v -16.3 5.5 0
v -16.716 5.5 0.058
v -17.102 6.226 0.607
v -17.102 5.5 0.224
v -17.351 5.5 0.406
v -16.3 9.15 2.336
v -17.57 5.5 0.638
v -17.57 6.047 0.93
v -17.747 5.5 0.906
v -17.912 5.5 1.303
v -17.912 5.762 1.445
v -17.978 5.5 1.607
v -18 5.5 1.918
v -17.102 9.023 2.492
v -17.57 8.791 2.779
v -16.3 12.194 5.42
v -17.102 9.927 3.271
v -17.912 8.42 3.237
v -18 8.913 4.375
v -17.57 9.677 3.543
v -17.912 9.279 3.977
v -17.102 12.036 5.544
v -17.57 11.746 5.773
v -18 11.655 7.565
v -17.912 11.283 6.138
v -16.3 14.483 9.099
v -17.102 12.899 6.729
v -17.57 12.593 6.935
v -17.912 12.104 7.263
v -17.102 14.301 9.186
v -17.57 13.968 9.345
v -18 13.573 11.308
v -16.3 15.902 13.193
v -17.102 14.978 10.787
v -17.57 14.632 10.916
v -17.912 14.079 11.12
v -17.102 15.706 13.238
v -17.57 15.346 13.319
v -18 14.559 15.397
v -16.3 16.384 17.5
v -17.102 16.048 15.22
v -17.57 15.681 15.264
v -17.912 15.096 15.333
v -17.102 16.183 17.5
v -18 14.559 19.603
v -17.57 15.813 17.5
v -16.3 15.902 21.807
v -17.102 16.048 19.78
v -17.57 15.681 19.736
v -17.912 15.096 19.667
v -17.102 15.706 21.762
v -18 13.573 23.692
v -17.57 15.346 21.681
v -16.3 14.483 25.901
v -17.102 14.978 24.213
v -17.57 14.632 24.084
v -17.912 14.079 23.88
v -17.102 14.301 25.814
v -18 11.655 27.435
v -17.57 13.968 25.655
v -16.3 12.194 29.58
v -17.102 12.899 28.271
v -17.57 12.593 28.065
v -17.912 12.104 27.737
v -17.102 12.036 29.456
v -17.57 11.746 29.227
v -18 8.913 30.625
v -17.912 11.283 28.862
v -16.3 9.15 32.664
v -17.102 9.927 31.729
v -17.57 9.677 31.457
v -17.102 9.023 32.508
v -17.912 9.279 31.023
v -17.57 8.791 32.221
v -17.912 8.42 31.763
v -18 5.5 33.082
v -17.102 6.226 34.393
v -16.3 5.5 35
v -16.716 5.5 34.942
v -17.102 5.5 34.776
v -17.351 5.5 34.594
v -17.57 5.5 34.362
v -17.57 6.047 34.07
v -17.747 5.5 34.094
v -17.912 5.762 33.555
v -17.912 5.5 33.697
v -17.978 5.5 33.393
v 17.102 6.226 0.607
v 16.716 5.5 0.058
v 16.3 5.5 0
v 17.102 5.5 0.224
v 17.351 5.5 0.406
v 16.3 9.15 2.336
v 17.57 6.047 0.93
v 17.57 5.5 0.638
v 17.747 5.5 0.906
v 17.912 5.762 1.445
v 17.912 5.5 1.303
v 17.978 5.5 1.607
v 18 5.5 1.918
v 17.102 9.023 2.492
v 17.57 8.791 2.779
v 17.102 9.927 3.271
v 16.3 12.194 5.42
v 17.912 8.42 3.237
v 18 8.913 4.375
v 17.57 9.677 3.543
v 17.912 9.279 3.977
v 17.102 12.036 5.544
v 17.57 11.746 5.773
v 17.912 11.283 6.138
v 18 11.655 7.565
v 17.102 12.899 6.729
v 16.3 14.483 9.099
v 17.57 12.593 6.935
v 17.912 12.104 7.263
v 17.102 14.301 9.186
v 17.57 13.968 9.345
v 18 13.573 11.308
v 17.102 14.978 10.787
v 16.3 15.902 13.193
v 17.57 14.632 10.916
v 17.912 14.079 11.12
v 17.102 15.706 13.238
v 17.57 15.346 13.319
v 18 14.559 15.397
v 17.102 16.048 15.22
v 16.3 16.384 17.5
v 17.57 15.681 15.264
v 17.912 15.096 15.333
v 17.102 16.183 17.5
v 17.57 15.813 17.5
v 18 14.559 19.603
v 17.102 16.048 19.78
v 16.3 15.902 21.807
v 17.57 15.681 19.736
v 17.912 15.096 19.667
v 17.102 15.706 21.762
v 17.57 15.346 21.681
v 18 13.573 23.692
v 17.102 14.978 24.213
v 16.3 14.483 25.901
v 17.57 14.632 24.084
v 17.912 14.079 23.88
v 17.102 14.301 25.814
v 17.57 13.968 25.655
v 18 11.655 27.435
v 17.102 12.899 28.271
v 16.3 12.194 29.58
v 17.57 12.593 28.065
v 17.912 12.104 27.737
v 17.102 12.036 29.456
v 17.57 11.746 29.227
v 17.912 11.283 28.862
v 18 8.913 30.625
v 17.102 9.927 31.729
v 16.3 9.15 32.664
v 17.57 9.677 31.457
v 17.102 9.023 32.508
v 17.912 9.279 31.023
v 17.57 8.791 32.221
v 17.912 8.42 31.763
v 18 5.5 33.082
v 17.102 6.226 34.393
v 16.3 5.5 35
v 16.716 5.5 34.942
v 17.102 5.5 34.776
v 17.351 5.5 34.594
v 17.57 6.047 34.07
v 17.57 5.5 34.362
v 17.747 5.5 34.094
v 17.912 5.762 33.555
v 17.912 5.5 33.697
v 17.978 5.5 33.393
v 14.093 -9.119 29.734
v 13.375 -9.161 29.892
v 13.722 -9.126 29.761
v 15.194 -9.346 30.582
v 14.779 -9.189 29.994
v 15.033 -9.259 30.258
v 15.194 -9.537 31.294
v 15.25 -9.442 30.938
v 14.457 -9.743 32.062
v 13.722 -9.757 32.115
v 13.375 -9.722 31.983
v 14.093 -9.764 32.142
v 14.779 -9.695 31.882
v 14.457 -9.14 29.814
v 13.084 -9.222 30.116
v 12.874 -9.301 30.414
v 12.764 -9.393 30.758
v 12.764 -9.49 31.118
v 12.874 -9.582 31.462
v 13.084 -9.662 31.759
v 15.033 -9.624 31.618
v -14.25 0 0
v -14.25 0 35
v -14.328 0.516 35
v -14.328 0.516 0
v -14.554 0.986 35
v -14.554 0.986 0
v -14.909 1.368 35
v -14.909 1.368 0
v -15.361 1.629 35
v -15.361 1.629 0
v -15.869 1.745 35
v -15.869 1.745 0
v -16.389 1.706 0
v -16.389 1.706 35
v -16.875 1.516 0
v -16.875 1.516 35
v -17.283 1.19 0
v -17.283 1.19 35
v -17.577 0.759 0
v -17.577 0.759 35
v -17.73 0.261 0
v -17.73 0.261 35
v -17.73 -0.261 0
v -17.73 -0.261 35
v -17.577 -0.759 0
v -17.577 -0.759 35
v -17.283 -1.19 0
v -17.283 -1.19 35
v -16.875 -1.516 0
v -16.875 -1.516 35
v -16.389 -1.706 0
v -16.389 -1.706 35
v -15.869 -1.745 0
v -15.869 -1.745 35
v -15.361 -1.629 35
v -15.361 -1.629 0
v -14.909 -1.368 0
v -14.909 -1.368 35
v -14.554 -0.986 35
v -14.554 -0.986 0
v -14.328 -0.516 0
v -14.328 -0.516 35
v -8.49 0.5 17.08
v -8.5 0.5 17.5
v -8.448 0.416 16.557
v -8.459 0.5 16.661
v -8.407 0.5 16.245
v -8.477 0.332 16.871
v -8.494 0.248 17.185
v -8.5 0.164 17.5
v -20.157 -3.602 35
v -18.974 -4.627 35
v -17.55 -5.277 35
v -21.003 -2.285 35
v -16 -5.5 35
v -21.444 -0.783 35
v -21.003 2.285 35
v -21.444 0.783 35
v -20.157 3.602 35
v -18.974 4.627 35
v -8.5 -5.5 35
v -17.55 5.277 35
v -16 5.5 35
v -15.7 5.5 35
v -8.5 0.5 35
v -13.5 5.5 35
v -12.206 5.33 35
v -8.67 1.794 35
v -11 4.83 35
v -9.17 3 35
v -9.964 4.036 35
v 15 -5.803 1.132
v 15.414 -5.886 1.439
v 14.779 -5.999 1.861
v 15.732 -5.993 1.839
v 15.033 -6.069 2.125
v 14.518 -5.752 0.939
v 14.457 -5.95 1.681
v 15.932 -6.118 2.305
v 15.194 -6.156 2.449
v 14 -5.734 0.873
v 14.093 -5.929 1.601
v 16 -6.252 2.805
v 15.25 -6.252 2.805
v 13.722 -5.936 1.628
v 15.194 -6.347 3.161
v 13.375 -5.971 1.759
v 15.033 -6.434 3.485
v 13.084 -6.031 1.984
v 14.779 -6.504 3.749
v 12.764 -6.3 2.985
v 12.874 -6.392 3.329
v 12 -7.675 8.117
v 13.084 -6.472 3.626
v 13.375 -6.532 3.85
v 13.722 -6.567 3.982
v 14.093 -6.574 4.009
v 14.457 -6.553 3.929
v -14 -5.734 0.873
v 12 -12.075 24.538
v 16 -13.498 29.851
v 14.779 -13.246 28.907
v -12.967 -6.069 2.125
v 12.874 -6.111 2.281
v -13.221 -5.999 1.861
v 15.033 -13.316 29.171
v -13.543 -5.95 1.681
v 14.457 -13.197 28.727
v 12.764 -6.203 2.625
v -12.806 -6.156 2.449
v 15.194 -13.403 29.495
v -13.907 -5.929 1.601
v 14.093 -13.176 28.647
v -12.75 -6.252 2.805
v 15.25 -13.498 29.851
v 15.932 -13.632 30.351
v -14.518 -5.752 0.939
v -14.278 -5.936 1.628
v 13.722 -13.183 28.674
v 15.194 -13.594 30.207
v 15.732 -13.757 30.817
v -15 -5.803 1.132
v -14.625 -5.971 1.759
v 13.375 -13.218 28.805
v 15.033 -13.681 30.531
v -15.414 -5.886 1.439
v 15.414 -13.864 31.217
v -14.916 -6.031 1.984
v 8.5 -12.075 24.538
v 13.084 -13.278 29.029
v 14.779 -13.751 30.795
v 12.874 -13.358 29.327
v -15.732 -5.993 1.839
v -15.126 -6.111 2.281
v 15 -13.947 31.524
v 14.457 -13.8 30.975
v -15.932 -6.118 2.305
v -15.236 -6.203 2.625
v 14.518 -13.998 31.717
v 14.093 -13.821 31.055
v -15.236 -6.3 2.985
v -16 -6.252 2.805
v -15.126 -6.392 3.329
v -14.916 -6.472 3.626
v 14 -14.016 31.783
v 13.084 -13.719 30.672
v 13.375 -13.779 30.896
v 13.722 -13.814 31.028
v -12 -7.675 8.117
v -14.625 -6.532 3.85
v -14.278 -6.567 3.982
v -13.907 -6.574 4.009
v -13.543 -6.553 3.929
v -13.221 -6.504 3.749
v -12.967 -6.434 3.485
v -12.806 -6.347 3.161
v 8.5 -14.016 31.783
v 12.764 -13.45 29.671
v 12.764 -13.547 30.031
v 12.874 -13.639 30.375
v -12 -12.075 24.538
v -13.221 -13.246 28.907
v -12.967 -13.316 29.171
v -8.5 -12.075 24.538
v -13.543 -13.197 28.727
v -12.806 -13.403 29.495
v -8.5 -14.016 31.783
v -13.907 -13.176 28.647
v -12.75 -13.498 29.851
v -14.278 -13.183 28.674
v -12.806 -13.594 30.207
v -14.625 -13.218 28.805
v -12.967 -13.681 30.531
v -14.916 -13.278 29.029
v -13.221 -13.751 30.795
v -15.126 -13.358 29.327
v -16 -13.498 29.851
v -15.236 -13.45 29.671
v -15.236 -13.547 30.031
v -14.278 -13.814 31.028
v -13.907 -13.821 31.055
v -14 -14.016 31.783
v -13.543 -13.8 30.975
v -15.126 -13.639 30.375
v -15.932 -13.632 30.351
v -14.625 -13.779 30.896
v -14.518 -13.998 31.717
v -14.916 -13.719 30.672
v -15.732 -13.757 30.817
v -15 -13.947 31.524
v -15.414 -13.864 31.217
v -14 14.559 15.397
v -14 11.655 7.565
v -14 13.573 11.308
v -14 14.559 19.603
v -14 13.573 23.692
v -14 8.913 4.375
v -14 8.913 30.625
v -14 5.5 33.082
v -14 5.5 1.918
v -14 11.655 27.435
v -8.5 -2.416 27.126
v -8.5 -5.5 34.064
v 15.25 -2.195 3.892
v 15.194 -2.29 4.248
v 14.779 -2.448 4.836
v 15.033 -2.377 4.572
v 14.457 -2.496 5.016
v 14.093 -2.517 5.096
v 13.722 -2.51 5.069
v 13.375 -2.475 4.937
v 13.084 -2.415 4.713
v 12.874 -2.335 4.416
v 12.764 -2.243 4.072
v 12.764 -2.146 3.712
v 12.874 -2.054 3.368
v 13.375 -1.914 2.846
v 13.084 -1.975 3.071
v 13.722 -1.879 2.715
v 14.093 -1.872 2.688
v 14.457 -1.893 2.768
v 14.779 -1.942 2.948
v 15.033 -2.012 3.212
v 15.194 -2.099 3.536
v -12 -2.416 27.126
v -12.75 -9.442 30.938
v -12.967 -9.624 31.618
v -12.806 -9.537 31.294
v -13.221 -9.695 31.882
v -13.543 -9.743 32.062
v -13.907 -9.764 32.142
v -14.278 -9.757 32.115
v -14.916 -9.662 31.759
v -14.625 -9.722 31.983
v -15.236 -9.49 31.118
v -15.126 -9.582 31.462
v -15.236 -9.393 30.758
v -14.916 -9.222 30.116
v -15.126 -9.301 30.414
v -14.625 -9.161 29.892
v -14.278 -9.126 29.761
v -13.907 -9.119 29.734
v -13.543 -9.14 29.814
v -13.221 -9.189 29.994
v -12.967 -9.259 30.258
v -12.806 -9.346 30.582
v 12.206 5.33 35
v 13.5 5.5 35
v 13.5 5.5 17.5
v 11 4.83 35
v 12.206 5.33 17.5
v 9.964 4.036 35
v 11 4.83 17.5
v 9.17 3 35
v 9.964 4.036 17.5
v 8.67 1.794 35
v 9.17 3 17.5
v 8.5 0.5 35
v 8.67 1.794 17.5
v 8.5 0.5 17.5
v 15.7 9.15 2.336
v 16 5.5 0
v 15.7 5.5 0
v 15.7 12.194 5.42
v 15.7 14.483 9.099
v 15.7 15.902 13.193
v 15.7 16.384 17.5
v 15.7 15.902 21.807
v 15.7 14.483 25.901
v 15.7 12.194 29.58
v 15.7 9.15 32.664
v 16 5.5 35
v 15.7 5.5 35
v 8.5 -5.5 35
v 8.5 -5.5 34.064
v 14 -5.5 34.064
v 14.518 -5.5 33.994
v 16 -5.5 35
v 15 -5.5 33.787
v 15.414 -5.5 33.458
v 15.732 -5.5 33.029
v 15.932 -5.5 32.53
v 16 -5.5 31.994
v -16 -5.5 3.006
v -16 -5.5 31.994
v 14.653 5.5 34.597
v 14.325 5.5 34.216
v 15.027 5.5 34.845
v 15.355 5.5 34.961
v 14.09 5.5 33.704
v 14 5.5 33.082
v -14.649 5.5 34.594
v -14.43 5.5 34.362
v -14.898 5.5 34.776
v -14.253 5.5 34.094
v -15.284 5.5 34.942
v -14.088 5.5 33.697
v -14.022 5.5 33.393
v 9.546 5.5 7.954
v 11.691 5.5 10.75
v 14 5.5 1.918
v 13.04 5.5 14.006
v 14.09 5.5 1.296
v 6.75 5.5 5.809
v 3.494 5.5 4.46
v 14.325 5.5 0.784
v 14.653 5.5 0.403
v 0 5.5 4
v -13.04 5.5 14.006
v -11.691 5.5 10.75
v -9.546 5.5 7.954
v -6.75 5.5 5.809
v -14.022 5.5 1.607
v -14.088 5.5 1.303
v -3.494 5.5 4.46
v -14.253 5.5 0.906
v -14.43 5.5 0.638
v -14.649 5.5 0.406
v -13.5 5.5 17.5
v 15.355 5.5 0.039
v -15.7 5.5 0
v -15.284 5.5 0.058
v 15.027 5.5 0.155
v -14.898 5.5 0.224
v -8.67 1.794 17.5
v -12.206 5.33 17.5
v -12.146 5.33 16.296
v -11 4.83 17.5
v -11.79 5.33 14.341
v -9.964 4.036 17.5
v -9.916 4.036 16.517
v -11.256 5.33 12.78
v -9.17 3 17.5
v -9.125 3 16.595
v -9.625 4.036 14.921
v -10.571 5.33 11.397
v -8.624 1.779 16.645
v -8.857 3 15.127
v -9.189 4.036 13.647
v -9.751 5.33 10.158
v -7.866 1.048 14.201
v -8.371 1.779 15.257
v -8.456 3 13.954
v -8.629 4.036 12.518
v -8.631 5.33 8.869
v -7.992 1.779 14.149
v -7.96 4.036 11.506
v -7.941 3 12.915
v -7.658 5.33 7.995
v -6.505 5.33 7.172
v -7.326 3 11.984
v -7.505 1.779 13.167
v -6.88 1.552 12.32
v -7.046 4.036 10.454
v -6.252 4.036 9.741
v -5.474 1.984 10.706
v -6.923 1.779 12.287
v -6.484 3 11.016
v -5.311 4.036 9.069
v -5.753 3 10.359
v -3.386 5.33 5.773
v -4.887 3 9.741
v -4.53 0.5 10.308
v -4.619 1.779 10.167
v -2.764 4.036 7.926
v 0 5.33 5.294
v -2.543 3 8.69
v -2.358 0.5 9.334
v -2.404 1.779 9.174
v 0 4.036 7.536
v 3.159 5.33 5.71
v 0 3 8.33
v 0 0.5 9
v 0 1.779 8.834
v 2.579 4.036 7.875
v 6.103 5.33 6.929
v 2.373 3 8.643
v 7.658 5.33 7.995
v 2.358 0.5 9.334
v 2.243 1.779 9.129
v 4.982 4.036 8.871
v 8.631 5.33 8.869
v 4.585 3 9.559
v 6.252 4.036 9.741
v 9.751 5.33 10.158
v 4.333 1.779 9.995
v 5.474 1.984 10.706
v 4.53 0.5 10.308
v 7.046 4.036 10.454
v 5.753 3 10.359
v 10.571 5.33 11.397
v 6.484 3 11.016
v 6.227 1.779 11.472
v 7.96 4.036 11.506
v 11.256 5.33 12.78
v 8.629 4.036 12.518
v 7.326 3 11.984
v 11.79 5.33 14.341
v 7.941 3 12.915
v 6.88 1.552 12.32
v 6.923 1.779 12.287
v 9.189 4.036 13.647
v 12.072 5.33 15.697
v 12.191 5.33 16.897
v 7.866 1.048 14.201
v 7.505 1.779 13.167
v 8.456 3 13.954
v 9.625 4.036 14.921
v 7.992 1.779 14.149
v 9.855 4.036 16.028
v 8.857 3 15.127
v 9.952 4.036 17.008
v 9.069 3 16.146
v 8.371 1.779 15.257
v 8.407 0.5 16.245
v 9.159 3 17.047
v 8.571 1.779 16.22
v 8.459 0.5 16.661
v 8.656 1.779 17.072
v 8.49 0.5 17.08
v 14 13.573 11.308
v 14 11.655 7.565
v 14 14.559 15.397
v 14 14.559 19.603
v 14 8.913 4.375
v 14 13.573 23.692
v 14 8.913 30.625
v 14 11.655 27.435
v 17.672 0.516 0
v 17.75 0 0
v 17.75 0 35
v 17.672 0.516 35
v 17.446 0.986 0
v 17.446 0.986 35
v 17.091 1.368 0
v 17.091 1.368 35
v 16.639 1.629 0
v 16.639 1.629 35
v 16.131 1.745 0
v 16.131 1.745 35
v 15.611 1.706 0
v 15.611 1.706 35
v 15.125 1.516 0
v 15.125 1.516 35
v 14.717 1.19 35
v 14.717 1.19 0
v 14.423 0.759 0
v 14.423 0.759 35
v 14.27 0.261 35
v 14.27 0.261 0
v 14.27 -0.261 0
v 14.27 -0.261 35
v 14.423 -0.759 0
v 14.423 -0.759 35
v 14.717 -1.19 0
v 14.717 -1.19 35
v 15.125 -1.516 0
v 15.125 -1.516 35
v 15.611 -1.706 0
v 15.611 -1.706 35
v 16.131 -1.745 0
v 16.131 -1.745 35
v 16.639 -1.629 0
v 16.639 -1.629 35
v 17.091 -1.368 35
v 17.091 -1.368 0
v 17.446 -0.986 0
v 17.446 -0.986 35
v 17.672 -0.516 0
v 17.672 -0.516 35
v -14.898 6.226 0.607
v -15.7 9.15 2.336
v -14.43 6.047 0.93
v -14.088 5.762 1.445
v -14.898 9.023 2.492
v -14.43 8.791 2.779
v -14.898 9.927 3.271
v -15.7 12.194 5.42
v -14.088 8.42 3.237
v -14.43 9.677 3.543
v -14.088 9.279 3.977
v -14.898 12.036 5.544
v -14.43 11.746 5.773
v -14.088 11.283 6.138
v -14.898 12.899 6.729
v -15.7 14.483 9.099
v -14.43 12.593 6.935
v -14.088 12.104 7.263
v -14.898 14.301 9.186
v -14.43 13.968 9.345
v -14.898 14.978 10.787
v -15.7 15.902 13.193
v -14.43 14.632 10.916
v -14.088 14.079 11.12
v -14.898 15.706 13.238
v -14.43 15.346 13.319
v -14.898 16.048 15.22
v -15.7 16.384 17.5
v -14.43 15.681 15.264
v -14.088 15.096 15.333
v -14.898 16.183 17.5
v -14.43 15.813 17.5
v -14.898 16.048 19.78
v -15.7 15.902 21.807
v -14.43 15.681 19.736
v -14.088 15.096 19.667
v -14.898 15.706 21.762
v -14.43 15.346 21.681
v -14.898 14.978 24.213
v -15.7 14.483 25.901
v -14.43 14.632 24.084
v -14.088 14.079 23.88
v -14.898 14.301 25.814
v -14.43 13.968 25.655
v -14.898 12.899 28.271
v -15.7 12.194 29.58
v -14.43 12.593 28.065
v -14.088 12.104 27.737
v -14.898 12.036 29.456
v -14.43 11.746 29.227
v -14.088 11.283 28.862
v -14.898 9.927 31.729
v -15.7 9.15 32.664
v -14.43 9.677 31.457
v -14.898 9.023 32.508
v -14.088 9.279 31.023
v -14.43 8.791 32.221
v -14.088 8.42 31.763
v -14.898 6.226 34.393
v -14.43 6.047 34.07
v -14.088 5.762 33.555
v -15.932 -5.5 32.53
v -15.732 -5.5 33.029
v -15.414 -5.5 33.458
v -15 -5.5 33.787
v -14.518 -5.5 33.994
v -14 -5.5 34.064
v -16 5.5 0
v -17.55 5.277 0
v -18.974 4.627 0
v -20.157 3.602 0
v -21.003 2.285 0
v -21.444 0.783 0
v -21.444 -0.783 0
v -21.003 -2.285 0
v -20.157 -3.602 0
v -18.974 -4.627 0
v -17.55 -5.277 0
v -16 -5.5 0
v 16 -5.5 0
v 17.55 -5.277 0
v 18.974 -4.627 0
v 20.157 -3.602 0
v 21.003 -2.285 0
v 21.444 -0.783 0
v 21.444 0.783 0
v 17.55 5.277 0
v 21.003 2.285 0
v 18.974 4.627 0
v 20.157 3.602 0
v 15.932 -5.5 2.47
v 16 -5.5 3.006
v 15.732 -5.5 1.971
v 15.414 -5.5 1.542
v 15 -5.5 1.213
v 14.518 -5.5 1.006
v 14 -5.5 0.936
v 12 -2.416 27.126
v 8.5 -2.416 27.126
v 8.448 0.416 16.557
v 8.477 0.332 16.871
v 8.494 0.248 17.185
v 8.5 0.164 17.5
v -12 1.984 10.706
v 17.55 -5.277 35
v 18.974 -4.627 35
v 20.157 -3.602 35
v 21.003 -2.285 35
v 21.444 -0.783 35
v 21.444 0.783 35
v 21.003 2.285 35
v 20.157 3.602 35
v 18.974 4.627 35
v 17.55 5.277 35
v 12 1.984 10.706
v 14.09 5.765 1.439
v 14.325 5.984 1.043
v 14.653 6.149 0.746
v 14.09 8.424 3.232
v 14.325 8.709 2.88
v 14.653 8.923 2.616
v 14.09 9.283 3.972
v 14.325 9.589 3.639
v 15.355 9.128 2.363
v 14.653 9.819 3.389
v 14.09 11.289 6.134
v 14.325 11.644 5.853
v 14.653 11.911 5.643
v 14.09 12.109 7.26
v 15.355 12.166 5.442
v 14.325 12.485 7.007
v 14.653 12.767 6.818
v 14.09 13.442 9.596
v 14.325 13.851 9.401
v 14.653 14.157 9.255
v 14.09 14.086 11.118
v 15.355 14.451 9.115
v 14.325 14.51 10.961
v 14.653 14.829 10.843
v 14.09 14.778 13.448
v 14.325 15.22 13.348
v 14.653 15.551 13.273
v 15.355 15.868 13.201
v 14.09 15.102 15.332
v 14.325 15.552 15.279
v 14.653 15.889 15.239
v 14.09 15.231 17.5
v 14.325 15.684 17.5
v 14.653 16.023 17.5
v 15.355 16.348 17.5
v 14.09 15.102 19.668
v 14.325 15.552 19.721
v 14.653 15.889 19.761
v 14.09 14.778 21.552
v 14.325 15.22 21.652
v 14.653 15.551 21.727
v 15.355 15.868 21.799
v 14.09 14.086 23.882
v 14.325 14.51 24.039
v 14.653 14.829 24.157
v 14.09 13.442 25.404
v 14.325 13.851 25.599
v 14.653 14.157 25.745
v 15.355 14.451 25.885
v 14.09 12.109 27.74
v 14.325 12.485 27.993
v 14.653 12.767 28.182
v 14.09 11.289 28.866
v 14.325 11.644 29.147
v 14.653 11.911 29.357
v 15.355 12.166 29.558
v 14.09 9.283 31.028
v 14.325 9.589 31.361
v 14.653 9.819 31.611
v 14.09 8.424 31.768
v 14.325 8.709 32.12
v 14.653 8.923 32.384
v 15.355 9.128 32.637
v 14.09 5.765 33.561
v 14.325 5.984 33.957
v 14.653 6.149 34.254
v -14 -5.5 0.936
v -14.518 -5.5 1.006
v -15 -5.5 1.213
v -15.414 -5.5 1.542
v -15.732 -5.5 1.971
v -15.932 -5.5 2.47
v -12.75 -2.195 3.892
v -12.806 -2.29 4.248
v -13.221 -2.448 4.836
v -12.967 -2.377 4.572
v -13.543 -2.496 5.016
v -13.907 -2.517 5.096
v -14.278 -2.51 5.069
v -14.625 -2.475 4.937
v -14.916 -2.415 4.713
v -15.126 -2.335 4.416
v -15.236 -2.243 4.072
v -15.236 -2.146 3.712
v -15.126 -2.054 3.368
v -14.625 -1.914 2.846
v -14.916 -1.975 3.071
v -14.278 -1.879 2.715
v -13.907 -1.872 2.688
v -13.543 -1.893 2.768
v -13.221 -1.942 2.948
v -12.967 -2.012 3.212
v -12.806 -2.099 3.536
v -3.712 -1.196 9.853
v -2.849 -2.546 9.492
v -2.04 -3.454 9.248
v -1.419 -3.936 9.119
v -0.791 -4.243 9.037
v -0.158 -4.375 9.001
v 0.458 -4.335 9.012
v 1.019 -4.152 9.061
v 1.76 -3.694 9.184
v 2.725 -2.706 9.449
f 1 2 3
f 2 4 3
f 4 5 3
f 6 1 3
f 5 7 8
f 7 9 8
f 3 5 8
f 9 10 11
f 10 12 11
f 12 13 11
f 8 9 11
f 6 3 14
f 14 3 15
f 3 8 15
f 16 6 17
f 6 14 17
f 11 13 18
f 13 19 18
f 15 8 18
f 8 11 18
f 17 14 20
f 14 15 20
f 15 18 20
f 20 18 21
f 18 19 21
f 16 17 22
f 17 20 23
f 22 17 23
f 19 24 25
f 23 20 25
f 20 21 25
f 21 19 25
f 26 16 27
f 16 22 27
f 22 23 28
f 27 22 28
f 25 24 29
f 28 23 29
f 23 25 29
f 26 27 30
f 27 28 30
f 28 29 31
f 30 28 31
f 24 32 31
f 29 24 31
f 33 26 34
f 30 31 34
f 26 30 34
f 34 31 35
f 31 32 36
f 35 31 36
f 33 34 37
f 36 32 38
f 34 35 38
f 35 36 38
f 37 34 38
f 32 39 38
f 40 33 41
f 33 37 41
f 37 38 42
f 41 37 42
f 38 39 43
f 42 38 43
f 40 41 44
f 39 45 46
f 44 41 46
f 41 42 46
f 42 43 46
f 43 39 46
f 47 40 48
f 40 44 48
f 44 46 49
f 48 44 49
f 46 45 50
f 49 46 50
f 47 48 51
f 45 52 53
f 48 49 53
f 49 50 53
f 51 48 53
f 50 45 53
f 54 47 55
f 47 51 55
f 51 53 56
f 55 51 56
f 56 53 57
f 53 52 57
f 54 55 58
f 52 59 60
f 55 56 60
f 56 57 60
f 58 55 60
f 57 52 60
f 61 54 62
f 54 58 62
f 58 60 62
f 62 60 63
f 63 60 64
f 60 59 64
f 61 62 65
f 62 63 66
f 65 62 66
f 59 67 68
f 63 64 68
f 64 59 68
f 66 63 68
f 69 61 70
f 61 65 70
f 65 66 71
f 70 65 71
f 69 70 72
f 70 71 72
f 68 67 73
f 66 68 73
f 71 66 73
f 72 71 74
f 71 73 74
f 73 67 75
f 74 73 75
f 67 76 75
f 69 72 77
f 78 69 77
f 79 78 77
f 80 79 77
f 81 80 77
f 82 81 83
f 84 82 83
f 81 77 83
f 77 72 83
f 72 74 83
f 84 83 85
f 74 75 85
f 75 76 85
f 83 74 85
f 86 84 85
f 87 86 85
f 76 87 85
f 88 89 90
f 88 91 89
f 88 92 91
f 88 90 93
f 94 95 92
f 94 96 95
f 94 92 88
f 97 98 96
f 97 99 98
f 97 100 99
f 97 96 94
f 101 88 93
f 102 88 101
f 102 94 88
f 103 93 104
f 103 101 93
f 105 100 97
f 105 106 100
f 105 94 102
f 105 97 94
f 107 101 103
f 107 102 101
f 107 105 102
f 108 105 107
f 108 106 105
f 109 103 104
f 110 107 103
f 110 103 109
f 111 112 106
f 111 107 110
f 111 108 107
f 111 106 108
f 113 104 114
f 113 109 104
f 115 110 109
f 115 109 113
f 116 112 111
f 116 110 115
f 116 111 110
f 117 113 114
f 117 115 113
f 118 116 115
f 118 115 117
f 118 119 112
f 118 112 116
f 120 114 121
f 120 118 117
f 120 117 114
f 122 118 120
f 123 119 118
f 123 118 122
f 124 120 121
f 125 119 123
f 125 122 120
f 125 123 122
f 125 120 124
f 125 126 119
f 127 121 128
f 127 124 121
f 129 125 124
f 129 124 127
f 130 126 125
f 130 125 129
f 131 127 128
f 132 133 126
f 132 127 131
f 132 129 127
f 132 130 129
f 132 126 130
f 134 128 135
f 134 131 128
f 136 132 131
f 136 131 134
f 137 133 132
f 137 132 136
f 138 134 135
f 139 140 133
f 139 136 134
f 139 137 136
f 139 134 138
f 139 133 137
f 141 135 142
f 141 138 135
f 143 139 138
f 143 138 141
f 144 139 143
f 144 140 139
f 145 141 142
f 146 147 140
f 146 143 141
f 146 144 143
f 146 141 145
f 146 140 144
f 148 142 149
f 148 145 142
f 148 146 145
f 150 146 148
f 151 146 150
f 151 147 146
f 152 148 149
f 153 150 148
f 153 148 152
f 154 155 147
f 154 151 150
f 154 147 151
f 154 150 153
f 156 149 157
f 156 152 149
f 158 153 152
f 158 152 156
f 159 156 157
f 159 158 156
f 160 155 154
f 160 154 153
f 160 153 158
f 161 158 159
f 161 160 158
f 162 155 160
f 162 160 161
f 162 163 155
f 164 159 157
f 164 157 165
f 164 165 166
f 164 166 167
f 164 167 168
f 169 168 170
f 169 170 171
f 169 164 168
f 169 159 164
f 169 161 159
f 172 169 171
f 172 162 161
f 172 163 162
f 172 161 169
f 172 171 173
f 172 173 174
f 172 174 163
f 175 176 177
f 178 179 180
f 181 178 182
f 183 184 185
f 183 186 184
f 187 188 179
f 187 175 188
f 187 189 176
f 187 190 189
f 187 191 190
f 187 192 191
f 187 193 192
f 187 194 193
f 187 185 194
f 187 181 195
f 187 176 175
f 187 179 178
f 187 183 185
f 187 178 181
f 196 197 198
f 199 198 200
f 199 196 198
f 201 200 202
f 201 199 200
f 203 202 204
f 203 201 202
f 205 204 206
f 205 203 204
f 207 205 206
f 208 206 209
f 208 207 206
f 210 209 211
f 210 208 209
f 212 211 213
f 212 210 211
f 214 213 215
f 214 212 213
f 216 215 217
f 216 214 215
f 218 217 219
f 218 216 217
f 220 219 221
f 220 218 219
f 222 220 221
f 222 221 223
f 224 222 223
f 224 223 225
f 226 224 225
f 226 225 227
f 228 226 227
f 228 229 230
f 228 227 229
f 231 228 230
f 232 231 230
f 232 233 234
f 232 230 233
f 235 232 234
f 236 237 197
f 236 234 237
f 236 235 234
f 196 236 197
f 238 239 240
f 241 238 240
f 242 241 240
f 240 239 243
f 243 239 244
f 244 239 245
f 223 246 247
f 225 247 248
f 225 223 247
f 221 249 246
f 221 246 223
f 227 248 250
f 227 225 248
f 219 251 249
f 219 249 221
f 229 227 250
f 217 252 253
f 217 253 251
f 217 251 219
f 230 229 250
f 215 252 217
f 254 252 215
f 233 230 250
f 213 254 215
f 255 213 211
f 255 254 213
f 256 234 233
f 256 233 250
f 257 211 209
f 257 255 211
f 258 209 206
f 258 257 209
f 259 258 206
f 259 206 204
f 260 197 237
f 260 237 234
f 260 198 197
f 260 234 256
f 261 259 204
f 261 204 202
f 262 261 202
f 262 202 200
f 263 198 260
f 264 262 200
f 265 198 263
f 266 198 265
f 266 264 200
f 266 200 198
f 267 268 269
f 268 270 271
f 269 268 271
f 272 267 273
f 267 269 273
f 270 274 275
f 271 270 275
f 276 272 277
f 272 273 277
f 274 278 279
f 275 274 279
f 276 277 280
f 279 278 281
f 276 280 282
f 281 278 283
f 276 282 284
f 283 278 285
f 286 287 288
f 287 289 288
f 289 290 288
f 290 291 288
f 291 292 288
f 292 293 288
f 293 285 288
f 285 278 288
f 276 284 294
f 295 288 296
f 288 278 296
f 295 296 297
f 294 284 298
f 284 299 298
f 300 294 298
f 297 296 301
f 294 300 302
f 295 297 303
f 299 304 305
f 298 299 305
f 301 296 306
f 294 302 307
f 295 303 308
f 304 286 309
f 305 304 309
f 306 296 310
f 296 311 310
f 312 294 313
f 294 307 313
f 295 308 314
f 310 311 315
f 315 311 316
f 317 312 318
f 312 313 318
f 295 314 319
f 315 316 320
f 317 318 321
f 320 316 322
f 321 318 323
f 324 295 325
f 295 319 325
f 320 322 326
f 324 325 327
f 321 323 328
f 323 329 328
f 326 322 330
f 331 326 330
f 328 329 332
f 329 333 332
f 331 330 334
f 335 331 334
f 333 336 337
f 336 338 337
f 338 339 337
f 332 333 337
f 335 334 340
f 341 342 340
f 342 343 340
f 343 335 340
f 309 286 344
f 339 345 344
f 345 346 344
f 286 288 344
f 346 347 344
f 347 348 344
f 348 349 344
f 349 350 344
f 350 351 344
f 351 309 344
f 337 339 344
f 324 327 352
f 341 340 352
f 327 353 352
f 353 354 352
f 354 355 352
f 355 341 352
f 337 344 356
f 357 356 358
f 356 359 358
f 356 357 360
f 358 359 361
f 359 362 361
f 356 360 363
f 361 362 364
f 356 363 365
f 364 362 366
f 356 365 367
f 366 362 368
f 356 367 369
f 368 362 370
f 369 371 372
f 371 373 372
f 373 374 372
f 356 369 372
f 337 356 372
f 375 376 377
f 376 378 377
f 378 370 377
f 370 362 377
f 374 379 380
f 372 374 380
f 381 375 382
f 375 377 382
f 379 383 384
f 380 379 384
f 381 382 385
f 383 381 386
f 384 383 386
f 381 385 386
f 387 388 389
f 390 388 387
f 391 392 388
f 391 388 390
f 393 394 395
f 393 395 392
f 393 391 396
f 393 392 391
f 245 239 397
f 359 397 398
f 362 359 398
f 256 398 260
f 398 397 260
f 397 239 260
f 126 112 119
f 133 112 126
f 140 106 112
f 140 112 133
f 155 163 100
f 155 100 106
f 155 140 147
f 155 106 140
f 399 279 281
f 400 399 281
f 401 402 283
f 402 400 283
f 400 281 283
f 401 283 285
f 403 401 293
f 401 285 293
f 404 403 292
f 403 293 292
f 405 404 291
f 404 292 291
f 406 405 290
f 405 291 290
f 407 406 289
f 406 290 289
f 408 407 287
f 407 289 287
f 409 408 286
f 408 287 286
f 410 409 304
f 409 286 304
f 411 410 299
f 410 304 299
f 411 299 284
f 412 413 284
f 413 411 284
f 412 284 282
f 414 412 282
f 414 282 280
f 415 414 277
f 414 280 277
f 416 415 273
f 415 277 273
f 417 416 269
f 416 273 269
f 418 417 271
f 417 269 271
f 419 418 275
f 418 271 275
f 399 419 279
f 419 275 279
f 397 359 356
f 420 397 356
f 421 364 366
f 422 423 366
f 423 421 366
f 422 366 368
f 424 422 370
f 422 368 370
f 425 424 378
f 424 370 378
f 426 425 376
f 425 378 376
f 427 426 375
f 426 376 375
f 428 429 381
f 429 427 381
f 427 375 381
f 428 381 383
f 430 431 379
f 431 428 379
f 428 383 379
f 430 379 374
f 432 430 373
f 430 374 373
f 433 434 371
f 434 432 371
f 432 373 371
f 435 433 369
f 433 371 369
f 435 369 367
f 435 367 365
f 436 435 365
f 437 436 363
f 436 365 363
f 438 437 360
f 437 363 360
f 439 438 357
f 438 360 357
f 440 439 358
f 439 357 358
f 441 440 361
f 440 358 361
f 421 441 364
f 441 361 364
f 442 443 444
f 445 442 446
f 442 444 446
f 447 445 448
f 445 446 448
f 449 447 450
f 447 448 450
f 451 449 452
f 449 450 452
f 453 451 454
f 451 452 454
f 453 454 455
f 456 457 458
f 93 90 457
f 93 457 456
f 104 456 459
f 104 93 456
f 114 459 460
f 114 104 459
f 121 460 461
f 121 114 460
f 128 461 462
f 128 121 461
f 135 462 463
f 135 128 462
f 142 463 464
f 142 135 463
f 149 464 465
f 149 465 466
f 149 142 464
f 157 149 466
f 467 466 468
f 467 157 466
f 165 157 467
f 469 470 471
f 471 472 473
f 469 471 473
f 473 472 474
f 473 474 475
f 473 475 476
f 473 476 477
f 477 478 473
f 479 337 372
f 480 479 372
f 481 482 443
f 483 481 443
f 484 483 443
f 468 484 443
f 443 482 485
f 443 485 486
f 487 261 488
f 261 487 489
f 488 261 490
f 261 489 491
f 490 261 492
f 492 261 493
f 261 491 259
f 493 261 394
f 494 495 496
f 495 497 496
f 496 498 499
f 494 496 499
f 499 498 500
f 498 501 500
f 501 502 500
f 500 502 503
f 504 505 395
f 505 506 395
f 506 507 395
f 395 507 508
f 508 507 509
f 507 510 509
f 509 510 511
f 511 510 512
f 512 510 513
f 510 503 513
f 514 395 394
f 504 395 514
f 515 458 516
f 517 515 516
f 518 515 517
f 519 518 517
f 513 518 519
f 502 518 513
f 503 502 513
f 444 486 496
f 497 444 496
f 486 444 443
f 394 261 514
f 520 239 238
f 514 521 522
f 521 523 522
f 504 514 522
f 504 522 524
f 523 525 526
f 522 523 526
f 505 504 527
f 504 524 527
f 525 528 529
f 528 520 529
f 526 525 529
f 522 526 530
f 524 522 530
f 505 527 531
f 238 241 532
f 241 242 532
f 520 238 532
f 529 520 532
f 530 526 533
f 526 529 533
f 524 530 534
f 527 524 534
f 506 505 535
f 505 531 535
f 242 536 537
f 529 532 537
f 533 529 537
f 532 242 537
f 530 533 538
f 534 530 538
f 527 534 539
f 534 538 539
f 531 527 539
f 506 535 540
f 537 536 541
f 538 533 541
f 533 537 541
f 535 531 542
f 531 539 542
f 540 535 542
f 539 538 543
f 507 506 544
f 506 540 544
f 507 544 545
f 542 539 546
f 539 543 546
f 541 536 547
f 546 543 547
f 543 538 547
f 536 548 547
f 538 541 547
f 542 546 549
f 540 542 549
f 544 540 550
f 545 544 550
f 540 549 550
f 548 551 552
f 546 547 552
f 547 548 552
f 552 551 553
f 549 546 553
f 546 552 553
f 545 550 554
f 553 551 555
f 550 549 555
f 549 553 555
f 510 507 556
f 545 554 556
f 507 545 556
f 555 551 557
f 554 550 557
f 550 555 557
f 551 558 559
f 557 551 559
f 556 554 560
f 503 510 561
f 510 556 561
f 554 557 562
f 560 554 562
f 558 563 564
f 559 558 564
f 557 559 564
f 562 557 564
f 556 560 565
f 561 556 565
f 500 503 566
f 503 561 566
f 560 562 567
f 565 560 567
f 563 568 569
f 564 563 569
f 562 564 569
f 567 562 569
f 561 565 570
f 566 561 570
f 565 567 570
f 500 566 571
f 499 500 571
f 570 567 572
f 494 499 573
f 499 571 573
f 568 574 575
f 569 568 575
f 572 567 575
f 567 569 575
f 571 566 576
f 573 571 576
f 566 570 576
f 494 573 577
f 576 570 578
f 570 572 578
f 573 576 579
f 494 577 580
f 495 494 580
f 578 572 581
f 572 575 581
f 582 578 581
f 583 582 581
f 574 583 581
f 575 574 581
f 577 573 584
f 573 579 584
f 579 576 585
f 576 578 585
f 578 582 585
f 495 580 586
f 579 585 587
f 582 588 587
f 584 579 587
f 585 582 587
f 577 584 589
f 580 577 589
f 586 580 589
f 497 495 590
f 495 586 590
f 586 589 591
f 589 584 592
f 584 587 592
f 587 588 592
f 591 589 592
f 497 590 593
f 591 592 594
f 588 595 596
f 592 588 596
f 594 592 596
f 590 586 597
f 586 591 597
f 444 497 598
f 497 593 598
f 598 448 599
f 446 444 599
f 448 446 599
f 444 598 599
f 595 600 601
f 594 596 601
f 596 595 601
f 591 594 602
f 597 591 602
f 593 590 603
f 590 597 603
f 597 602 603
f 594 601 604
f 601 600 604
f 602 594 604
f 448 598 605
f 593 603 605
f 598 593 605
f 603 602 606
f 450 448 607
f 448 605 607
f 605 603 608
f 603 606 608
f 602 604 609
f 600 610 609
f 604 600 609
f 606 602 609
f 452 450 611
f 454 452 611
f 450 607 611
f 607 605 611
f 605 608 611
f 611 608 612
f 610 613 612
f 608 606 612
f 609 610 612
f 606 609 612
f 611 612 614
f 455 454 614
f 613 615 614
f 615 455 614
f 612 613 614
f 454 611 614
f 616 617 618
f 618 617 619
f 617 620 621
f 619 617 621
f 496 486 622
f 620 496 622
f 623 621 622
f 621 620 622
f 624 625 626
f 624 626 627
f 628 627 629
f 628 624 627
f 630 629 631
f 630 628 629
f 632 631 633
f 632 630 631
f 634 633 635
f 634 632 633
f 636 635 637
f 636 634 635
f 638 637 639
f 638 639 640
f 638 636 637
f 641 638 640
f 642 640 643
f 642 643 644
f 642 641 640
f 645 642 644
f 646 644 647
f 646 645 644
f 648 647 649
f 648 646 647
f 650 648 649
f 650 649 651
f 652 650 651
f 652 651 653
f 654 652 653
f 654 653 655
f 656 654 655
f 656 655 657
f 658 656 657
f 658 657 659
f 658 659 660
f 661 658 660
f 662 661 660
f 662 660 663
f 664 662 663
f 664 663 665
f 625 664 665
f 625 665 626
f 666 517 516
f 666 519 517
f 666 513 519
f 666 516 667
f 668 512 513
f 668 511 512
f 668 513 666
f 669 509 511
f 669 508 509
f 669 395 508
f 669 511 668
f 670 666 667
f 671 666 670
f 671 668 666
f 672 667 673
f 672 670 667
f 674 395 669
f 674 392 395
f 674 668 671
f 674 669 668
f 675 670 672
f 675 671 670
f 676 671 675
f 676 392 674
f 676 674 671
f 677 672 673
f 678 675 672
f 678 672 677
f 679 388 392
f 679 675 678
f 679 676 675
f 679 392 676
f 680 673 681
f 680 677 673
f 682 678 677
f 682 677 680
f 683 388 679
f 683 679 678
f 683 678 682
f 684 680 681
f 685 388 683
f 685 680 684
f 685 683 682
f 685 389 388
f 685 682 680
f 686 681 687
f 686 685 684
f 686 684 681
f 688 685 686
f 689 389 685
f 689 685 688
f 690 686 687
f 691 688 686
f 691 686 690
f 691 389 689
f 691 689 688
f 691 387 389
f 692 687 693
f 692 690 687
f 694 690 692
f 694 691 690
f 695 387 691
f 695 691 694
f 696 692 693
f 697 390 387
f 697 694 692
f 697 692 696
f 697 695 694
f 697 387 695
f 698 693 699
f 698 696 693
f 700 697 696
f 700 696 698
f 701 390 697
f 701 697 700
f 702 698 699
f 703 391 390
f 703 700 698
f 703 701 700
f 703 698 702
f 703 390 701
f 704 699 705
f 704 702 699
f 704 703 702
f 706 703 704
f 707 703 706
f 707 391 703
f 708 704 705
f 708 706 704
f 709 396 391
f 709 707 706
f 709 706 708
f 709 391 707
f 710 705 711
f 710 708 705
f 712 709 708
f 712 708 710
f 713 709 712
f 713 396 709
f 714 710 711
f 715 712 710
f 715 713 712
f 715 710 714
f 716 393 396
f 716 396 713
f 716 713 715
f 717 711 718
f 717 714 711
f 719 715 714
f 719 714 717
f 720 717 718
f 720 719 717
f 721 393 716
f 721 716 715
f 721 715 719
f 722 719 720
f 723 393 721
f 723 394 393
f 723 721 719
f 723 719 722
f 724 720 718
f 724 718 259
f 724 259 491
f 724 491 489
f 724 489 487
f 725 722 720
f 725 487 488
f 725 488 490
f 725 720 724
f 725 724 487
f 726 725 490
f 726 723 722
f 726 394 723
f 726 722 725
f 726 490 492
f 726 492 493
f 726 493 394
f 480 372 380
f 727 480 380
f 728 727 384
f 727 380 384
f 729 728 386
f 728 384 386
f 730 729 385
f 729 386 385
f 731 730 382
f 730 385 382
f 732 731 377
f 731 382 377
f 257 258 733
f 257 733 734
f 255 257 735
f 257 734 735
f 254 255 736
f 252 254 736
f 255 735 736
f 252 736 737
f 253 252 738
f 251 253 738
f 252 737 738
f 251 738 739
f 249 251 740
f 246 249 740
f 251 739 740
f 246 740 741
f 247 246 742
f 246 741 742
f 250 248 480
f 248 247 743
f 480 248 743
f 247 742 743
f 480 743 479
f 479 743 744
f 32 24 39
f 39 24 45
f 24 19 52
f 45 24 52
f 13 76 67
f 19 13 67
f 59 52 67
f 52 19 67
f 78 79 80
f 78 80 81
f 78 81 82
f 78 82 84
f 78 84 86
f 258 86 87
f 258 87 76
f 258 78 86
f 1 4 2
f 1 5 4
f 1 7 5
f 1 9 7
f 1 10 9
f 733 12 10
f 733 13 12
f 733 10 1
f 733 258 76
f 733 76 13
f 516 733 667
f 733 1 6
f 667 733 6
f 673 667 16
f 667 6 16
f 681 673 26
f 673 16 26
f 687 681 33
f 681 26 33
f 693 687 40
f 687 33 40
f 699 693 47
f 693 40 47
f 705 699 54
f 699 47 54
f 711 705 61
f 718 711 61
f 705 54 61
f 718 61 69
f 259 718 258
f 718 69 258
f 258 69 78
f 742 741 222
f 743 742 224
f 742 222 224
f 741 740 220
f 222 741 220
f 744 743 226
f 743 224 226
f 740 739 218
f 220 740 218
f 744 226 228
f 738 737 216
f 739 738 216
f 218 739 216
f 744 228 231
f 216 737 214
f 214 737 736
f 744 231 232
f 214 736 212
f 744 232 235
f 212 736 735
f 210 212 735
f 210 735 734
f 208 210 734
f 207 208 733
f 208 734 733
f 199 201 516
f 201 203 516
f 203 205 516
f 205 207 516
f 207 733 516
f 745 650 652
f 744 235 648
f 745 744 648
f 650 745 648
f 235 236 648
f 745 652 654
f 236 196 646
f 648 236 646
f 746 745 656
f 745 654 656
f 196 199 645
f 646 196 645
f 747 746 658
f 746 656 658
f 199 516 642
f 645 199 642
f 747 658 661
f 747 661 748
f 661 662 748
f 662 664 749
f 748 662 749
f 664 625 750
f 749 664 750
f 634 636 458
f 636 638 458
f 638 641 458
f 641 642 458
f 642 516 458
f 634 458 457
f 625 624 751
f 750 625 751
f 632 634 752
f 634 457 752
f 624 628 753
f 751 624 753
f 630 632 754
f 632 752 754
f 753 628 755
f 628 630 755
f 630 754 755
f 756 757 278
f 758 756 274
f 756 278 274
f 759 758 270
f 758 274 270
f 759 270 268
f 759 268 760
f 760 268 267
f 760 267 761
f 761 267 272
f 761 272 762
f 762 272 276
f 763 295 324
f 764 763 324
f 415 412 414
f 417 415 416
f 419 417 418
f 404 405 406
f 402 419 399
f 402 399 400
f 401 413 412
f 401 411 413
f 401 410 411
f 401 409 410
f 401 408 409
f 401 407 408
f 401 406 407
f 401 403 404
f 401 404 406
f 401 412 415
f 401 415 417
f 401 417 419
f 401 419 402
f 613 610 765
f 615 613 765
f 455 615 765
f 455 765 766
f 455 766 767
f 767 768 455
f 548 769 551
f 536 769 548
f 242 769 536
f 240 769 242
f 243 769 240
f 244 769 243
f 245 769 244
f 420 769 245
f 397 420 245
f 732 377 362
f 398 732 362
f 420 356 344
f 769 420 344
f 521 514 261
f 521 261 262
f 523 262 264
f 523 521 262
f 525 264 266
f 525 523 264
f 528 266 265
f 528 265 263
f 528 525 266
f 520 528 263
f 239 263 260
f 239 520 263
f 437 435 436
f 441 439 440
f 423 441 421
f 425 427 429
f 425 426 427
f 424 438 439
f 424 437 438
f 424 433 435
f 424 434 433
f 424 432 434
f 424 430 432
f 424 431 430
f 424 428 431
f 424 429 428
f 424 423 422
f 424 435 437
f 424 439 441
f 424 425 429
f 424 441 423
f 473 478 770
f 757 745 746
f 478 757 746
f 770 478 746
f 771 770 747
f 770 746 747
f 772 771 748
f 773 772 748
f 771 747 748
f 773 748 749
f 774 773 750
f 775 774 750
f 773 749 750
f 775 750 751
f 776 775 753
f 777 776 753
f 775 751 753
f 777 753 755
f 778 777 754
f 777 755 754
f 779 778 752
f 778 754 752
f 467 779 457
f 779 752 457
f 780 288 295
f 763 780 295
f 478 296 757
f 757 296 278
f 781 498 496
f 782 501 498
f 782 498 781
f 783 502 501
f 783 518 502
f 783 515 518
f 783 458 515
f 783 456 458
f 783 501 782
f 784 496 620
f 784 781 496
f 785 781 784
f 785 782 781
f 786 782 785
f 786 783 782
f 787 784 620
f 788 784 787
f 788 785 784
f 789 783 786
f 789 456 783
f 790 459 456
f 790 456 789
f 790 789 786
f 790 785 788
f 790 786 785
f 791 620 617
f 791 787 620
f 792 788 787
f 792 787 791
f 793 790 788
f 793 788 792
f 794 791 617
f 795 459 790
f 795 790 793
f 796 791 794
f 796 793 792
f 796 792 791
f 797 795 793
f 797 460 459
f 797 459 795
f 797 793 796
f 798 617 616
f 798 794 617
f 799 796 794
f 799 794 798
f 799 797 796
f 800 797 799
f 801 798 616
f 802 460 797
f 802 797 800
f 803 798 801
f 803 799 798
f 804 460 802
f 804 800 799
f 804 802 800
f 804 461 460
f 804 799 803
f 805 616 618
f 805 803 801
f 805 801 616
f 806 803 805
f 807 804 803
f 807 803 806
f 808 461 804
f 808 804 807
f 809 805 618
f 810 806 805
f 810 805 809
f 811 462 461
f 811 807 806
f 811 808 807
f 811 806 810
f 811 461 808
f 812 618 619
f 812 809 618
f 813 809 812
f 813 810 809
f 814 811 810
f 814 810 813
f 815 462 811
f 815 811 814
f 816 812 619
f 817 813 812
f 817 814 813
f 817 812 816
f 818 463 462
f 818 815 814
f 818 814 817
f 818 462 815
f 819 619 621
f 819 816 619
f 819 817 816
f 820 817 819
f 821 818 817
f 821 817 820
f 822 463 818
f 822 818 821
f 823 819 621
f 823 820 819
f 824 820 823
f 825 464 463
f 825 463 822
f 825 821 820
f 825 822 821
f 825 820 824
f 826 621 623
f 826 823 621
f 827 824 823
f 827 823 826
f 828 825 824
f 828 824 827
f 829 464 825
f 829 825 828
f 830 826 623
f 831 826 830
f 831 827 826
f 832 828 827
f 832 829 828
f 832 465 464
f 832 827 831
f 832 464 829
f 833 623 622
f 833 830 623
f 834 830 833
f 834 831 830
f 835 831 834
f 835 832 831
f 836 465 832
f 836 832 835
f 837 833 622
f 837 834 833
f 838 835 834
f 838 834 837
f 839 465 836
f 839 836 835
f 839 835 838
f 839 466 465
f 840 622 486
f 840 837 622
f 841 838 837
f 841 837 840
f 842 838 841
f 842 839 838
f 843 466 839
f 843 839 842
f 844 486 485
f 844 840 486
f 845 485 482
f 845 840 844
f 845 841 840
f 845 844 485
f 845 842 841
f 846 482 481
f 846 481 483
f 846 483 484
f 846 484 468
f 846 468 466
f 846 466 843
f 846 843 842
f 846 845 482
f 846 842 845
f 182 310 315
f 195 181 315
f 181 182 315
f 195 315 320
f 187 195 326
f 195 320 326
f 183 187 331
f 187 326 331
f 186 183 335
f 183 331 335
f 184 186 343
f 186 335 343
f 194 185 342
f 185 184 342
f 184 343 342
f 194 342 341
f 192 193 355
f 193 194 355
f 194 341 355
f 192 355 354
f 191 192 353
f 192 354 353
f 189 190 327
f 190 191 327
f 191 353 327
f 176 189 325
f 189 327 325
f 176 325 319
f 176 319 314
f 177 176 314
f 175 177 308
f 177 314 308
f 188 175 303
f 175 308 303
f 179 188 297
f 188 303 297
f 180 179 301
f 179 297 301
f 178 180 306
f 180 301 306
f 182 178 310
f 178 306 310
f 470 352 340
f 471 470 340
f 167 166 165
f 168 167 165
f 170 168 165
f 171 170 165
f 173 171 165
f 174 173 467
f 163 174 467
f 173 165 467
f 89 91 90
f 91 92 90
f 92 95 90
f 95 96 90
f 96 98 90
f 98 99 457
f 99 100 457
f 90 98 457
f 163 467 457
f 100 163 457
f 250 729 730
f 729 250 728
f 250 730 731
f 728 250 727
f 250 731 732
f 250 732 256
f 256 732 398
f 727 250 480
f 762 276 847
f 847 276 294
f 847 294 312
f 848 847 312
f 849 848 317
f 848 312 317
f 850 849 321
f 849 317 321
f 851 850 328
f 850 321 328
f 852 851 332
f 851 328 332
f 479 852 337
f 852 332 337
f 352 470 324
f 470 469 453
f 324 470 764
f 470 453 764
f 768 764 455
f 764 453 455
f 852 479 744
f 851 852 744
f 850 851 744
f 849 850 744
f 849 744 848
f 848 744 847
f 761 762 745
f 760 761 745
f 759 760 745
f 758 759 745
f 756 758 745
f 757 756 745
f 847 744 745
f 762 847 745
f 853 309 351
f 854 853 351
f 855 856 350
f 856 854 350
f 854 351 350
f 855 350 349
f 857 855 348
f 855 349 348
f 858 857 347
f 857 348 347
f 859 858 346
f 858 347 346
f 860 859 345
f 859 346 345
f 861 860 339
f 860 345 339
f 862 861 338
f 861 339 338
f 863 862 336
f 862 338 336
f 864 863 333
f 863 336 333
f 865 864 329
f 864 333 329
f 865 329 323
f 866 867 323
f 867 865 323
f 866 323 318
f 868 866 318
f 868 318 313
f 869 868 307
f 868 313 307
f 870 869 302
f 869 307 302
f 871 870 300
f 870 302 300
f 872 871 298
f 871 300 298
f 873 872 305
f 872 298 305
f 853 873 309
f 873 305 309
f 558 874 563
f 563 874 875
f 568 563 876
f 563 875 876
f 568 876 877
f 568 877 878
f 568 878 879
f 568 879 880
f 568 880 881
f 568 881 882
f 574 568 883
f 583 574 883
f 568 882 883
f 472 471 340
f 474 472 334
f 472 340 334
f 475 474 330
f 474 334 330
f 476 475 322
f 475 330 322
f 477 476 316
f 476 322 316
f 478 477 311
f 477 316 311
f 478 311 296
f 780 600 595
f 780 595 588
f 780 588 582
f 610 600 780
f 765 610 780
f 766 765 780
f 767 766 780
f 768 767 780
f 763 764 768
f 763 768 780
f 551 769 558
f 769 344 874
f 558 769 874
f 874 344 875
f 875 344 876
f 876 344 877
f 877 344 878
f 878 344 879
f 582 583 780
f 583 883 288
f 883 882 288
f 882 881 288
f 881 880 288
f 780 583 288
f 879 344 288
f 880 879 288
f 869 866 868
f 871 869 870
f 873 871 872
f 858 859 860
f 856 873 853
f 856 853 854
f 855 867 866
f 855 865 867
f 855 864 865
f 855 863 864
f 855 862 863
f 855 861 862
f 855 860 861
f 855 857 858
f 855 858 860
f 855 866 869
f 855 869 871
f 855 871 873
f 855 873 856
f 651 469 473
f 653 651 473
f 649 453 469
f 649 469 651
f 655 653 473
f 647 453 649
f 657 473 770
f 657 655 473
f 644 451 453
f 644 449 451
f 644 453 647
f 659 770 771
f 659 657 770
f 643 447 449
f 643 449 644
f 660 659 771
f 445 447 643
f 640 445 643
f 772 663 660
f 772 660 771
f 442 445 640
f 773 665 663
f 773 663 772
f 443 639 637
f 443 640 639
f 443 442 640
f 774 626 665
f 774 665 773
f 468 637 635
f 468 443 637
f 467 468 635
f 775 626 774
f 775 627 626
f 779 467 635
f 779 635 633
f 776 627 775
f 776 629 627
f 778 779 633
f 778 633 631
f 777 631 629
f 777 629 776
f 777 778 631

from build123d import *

# Parameters (mm, degrees)
F0_R           = 1.75
F1_DEPTH       = 35
F3_DEPTH       = 11.001
F6_REACH       = 64.9396846637
F8_DEPTH       = 25
F9_R           = 1.25
F10_DEPTH      = 4.2
F12_DEPTH      = 10
F14_DEPTH      = 2
F14_DEPTH_BACK = 2
F16_R          = 1.7
F17_T1_DEPTH   = 30
F17_T4_ANGLE   = 180


# Not quite as in the source:
# - a fillet or chamfer that OpenCascade refuses, or shapes differently, is made with other operations: its cross-section is extruded or revolved along the edge and cut away or added
# - a feature of the source that left no trace in its solid (it failed there, or was rolled back) is left out


with BuildPart() as f1:
    # F0 (on Top) → F1 (new body)
    with BuildSketch(Plane.XY):
        with BuildLine():
            Line((16, 5.5), (-16, 5.5))
            ThreePointArc((-16, 5.5), (-21.5, 0), (-16, -5.5))
            Line((-16, -5.5), (16, -5.5))
            ThreePointArc((16, -5.5), (21.5, 0), (16, 5.5))
        make_face()
        with Locations((-16, 0)):
            Circle(F0_R, mode=Mode.SUBTRACT)
        with Locations((16, 0)):
            Circle(F0_R, mode=Mode.SUBTRACT)
    extrude(amount=F1_DEPTH)

    # F2 (on face) → F3 (cut, through all)
    with BuildSketch(Plane.XZ.offset(5.5)):
        with BuildLine():
            Line((-8.5, 35), (-8.5, 17.5))
            ThreePointArc((-8.5, 17.5), (0, 9), (8.5, 17.5))
            Line((8.5, 17.5), (8.5, 35))
            Line((8.5, 35), (-8.5, 35))
        make_face()
    extrude(amount=-F3_DEPTH, mode=Mode.SUBTRACT)

    f6_end = Plane(origin=(0, -5.5, 14.4059555713), x_dir=(0, 0, -1), z_dir=(0, -1, 0))
    # F5 (on face) → F6 (join, up to a plane its end follows)
    with BuildSketch(Plane(origin=(0, -5.1315698604, -1.375), x_dir=(-1, 0, 0), z_dir=(0, 0.9659258263, 0.2588190451))):
        with BuildLine():
            ThreePointArc((16, 32.3272067081), (15.4142135624, 33.7414202705), (14, 34.3272067081))
            Line((14, 34.3272067081), (-14, 34.3272067081))
            ThreePointArc((-14, 34.3272067081), (-15.4142135624, 33.7414202705), (-16, 32.3272067081))
            Line((-16, 32.3272067081), (-16, 4.3272067081))
            ThreePointArc((-16, 4.3272067081), (-15.4142135624, 2.9129931457), (-14, 2.3272067081))
            Line((-14, 2.3272067081), (14, 2.3272067081))
            ThreePointArc((14, 2.3272067081), (15.4142135624, 2.9129931457), (16, 4.3272067081))
            Line((16, 4.3272067081), (16, 32.3272067081))
        make_face()
    f6_long = extrude(amount=F6_REACH, mode=Mode.PRIVATE)
    add(split(f6_long, bisect_by=f6_end, keep=Keep.TOP, mode=Mode.PRIVATE))

    # F7 (on face) → F8 (cut)
    with BuildSketch(Plane(origin=(0, 5.5, 0), x_dir=(-1, 0, 0), z_dir=(0, 1, 0))):
        with BuildLine():
            Line((8.5, 35), (-8.5, 35))
            Line((-8.5, 35), (-8.5, 17.5))
            ThreePointArc((-8.5, 17.5), (0, 9), (8.5, 17.5))
            Line((8.5, 17.5), (8.5, 35))
        make_face()
    extrude(amount=-F8_DEPTH, mode=Mode.SUBTRACT)

    # F9 (on face) → F10 (cut)
    with BuildSketch(Plane(origin=(0, -5.1315698604, -1.375), x_dir=(1, 0, 0), z_dir=(0, -0.9659258263, -0.2588190451))):
        with Locations((-14, 32.3272067081)):
            Circle(F9_R)
        with Locations((14, 32.3272067081)):
            Circle(F9_R)
        with Locations((14, 4.3272067081)):
            Circle(F9_R)
        with Locations((-14, 4.3272067081)):
            Circle(F9_R)
    extrude(amount=-F10_DEPTH, mode=Mode.SUBTRACT)

    # F11 (on face) → F12 (cut)
    with BuildSketch(Plane(origin=(0, -5.1315698604, -1.375), x_dir=(1, 0, 0), z_dir=(0, -0.9659258263, -0.2588190451))):
        with BuildLine():
            Line((8.5, 19.5408379052), (8.5, 26.8272067081))
            Line((8.5, 26.8272067081), (-8.5, 26.8272067081))
            Line((-8.5, 26.8272067081), (-8.5, 19.5408379052))
            add(Edge.make_bspline(
                [(8.5, 19.5408379052), (8.5, 10.7409903718), (0, 10.7409903718), (-8.5, 10.7409903718), (-8.5, 19.5408379052)],
                knots=[4.7123889804, 4.7123889804, 4.7123889804, 6.2831853072, 6.2831853072, 7.853981634, 7.853981634, 7.853981634], degree=2, weights=[1, 0.7071067812, 1, 0.7071067812, 1]))
        make_face()
        with BuildLine():
            Line((12, 9.8272067081), (12, 26.8272067081))
            Line((12, 26.8272067081), (8.5, 26.8272067081))
            Line((8.5, 26.8272067081), (8.5, 19.5408379052))
            add(Edge.make_bspline(
                [(8.5, 19.5408379052), (8.5, 10.7409903718), (0, 10.7409903718), (-8.5, 10.7409903718), (-8.5, 19.5408379052)],
                knots=[4.7123889804, 4.7123889804, 4.7123889804, 6.2831853072, 6.2831853072, 7.853981634, 7.853981634, 7.853981634], degree=2, weights=[1, 0.7071067812, 1, 0.7071067812, 1]))
            Line((-8.5, 19.5408379052), (-8.5, 26.8272067081))
            Line((-8.5, 26.8272067081), (-12, 26.8272067081))
            Line((-12, 26.8272067081), (-12, 9.8272067081))
            Line((-12, 9.8272067081), (12, 9.8272067081))
        make_face()
    extrude(amount=-F12_DEPTH, mode=Mode.SUBTRACT)

    # F13 (on face) → F14 (join, two sides)
    with BuildSketch(Plane.YZ.offset(16)) as f14_sk:
        with BuildLine():
            ThreePointArc((5.5, 0), (16.3836762358, 17.5), (5.5, 35))
            Line((5.5, 35), (5.5, 0))
        make_face()
    extrude(amount=F14_DEPTH)
    extrude(f14_sk.sketch, amount=-F14_DEPTH_BACK)

    # F15: F1 across plane


with BuildPart() as f1_1:
    add(f1.part)
    add(f1.part.mirror(Plane.YZ))

    # F16
    f16_edges = [f1_1.edges().sort_by_distance(p)[0] for p in [
        (18, 16.383676, 17.5),
        (14, 16.383676, 17.5),
        (-14, 16.383676, 17.5),
        (-18, 16.383676, 17.5),
    ]]
    fillet(f16_edges, radius=F16_R)

    # F17: fillet of radius 5 on 3 edges, made by hand

    # F17_s2 → F17_t1 (cut)
    with BuildSketch(Plane.XY.offset(17.5)):
        with BuildLine():
            ThreePointArc((13.5, 5.5), (9.9644660941, 4.0355339059), (8.5, 0.5))
            Line((8.5, 0.5), (8.5, 5.5))
            Line((8.5, 5.5), (13.5, 5.5))
        make_face()
        with BuildLine():
            ThreePointArc((-13.5, 5.5), (-9.9644660941, 4.0355339059), (-8.5, 0.5))
            Line((-8.5, 0.5), (-8.5, 5.5))
            Line((-8.5, 5.5), (-13.5, 5.5))
        make_face()
    extrude(amount=F17_T1_DEPTH, mode=Mode.SUBTRACT)

    # F17_s3 → F17_t4 (revolve, cut)
    with BuildSketch(Plane.XY.offset(17.5)):
        with BuildLine():
            ThreePointArc((-13.5, 5.5), (-9.9644660941, 4.0355339059), (-8.5, 0.5))
            Line((-8.5, 0.5), (-8.5, 5.5))
            Line((-8.5, 5.5), (-13.5, 5.5))
        make_face()
    revolve(axis=Axis((0, 5.5, 17.5), (0, -1, 0)), revolution_arc=F17_T4_ANGLE, mode=Mode.SUBTRACT)


solid = f1_1.part
